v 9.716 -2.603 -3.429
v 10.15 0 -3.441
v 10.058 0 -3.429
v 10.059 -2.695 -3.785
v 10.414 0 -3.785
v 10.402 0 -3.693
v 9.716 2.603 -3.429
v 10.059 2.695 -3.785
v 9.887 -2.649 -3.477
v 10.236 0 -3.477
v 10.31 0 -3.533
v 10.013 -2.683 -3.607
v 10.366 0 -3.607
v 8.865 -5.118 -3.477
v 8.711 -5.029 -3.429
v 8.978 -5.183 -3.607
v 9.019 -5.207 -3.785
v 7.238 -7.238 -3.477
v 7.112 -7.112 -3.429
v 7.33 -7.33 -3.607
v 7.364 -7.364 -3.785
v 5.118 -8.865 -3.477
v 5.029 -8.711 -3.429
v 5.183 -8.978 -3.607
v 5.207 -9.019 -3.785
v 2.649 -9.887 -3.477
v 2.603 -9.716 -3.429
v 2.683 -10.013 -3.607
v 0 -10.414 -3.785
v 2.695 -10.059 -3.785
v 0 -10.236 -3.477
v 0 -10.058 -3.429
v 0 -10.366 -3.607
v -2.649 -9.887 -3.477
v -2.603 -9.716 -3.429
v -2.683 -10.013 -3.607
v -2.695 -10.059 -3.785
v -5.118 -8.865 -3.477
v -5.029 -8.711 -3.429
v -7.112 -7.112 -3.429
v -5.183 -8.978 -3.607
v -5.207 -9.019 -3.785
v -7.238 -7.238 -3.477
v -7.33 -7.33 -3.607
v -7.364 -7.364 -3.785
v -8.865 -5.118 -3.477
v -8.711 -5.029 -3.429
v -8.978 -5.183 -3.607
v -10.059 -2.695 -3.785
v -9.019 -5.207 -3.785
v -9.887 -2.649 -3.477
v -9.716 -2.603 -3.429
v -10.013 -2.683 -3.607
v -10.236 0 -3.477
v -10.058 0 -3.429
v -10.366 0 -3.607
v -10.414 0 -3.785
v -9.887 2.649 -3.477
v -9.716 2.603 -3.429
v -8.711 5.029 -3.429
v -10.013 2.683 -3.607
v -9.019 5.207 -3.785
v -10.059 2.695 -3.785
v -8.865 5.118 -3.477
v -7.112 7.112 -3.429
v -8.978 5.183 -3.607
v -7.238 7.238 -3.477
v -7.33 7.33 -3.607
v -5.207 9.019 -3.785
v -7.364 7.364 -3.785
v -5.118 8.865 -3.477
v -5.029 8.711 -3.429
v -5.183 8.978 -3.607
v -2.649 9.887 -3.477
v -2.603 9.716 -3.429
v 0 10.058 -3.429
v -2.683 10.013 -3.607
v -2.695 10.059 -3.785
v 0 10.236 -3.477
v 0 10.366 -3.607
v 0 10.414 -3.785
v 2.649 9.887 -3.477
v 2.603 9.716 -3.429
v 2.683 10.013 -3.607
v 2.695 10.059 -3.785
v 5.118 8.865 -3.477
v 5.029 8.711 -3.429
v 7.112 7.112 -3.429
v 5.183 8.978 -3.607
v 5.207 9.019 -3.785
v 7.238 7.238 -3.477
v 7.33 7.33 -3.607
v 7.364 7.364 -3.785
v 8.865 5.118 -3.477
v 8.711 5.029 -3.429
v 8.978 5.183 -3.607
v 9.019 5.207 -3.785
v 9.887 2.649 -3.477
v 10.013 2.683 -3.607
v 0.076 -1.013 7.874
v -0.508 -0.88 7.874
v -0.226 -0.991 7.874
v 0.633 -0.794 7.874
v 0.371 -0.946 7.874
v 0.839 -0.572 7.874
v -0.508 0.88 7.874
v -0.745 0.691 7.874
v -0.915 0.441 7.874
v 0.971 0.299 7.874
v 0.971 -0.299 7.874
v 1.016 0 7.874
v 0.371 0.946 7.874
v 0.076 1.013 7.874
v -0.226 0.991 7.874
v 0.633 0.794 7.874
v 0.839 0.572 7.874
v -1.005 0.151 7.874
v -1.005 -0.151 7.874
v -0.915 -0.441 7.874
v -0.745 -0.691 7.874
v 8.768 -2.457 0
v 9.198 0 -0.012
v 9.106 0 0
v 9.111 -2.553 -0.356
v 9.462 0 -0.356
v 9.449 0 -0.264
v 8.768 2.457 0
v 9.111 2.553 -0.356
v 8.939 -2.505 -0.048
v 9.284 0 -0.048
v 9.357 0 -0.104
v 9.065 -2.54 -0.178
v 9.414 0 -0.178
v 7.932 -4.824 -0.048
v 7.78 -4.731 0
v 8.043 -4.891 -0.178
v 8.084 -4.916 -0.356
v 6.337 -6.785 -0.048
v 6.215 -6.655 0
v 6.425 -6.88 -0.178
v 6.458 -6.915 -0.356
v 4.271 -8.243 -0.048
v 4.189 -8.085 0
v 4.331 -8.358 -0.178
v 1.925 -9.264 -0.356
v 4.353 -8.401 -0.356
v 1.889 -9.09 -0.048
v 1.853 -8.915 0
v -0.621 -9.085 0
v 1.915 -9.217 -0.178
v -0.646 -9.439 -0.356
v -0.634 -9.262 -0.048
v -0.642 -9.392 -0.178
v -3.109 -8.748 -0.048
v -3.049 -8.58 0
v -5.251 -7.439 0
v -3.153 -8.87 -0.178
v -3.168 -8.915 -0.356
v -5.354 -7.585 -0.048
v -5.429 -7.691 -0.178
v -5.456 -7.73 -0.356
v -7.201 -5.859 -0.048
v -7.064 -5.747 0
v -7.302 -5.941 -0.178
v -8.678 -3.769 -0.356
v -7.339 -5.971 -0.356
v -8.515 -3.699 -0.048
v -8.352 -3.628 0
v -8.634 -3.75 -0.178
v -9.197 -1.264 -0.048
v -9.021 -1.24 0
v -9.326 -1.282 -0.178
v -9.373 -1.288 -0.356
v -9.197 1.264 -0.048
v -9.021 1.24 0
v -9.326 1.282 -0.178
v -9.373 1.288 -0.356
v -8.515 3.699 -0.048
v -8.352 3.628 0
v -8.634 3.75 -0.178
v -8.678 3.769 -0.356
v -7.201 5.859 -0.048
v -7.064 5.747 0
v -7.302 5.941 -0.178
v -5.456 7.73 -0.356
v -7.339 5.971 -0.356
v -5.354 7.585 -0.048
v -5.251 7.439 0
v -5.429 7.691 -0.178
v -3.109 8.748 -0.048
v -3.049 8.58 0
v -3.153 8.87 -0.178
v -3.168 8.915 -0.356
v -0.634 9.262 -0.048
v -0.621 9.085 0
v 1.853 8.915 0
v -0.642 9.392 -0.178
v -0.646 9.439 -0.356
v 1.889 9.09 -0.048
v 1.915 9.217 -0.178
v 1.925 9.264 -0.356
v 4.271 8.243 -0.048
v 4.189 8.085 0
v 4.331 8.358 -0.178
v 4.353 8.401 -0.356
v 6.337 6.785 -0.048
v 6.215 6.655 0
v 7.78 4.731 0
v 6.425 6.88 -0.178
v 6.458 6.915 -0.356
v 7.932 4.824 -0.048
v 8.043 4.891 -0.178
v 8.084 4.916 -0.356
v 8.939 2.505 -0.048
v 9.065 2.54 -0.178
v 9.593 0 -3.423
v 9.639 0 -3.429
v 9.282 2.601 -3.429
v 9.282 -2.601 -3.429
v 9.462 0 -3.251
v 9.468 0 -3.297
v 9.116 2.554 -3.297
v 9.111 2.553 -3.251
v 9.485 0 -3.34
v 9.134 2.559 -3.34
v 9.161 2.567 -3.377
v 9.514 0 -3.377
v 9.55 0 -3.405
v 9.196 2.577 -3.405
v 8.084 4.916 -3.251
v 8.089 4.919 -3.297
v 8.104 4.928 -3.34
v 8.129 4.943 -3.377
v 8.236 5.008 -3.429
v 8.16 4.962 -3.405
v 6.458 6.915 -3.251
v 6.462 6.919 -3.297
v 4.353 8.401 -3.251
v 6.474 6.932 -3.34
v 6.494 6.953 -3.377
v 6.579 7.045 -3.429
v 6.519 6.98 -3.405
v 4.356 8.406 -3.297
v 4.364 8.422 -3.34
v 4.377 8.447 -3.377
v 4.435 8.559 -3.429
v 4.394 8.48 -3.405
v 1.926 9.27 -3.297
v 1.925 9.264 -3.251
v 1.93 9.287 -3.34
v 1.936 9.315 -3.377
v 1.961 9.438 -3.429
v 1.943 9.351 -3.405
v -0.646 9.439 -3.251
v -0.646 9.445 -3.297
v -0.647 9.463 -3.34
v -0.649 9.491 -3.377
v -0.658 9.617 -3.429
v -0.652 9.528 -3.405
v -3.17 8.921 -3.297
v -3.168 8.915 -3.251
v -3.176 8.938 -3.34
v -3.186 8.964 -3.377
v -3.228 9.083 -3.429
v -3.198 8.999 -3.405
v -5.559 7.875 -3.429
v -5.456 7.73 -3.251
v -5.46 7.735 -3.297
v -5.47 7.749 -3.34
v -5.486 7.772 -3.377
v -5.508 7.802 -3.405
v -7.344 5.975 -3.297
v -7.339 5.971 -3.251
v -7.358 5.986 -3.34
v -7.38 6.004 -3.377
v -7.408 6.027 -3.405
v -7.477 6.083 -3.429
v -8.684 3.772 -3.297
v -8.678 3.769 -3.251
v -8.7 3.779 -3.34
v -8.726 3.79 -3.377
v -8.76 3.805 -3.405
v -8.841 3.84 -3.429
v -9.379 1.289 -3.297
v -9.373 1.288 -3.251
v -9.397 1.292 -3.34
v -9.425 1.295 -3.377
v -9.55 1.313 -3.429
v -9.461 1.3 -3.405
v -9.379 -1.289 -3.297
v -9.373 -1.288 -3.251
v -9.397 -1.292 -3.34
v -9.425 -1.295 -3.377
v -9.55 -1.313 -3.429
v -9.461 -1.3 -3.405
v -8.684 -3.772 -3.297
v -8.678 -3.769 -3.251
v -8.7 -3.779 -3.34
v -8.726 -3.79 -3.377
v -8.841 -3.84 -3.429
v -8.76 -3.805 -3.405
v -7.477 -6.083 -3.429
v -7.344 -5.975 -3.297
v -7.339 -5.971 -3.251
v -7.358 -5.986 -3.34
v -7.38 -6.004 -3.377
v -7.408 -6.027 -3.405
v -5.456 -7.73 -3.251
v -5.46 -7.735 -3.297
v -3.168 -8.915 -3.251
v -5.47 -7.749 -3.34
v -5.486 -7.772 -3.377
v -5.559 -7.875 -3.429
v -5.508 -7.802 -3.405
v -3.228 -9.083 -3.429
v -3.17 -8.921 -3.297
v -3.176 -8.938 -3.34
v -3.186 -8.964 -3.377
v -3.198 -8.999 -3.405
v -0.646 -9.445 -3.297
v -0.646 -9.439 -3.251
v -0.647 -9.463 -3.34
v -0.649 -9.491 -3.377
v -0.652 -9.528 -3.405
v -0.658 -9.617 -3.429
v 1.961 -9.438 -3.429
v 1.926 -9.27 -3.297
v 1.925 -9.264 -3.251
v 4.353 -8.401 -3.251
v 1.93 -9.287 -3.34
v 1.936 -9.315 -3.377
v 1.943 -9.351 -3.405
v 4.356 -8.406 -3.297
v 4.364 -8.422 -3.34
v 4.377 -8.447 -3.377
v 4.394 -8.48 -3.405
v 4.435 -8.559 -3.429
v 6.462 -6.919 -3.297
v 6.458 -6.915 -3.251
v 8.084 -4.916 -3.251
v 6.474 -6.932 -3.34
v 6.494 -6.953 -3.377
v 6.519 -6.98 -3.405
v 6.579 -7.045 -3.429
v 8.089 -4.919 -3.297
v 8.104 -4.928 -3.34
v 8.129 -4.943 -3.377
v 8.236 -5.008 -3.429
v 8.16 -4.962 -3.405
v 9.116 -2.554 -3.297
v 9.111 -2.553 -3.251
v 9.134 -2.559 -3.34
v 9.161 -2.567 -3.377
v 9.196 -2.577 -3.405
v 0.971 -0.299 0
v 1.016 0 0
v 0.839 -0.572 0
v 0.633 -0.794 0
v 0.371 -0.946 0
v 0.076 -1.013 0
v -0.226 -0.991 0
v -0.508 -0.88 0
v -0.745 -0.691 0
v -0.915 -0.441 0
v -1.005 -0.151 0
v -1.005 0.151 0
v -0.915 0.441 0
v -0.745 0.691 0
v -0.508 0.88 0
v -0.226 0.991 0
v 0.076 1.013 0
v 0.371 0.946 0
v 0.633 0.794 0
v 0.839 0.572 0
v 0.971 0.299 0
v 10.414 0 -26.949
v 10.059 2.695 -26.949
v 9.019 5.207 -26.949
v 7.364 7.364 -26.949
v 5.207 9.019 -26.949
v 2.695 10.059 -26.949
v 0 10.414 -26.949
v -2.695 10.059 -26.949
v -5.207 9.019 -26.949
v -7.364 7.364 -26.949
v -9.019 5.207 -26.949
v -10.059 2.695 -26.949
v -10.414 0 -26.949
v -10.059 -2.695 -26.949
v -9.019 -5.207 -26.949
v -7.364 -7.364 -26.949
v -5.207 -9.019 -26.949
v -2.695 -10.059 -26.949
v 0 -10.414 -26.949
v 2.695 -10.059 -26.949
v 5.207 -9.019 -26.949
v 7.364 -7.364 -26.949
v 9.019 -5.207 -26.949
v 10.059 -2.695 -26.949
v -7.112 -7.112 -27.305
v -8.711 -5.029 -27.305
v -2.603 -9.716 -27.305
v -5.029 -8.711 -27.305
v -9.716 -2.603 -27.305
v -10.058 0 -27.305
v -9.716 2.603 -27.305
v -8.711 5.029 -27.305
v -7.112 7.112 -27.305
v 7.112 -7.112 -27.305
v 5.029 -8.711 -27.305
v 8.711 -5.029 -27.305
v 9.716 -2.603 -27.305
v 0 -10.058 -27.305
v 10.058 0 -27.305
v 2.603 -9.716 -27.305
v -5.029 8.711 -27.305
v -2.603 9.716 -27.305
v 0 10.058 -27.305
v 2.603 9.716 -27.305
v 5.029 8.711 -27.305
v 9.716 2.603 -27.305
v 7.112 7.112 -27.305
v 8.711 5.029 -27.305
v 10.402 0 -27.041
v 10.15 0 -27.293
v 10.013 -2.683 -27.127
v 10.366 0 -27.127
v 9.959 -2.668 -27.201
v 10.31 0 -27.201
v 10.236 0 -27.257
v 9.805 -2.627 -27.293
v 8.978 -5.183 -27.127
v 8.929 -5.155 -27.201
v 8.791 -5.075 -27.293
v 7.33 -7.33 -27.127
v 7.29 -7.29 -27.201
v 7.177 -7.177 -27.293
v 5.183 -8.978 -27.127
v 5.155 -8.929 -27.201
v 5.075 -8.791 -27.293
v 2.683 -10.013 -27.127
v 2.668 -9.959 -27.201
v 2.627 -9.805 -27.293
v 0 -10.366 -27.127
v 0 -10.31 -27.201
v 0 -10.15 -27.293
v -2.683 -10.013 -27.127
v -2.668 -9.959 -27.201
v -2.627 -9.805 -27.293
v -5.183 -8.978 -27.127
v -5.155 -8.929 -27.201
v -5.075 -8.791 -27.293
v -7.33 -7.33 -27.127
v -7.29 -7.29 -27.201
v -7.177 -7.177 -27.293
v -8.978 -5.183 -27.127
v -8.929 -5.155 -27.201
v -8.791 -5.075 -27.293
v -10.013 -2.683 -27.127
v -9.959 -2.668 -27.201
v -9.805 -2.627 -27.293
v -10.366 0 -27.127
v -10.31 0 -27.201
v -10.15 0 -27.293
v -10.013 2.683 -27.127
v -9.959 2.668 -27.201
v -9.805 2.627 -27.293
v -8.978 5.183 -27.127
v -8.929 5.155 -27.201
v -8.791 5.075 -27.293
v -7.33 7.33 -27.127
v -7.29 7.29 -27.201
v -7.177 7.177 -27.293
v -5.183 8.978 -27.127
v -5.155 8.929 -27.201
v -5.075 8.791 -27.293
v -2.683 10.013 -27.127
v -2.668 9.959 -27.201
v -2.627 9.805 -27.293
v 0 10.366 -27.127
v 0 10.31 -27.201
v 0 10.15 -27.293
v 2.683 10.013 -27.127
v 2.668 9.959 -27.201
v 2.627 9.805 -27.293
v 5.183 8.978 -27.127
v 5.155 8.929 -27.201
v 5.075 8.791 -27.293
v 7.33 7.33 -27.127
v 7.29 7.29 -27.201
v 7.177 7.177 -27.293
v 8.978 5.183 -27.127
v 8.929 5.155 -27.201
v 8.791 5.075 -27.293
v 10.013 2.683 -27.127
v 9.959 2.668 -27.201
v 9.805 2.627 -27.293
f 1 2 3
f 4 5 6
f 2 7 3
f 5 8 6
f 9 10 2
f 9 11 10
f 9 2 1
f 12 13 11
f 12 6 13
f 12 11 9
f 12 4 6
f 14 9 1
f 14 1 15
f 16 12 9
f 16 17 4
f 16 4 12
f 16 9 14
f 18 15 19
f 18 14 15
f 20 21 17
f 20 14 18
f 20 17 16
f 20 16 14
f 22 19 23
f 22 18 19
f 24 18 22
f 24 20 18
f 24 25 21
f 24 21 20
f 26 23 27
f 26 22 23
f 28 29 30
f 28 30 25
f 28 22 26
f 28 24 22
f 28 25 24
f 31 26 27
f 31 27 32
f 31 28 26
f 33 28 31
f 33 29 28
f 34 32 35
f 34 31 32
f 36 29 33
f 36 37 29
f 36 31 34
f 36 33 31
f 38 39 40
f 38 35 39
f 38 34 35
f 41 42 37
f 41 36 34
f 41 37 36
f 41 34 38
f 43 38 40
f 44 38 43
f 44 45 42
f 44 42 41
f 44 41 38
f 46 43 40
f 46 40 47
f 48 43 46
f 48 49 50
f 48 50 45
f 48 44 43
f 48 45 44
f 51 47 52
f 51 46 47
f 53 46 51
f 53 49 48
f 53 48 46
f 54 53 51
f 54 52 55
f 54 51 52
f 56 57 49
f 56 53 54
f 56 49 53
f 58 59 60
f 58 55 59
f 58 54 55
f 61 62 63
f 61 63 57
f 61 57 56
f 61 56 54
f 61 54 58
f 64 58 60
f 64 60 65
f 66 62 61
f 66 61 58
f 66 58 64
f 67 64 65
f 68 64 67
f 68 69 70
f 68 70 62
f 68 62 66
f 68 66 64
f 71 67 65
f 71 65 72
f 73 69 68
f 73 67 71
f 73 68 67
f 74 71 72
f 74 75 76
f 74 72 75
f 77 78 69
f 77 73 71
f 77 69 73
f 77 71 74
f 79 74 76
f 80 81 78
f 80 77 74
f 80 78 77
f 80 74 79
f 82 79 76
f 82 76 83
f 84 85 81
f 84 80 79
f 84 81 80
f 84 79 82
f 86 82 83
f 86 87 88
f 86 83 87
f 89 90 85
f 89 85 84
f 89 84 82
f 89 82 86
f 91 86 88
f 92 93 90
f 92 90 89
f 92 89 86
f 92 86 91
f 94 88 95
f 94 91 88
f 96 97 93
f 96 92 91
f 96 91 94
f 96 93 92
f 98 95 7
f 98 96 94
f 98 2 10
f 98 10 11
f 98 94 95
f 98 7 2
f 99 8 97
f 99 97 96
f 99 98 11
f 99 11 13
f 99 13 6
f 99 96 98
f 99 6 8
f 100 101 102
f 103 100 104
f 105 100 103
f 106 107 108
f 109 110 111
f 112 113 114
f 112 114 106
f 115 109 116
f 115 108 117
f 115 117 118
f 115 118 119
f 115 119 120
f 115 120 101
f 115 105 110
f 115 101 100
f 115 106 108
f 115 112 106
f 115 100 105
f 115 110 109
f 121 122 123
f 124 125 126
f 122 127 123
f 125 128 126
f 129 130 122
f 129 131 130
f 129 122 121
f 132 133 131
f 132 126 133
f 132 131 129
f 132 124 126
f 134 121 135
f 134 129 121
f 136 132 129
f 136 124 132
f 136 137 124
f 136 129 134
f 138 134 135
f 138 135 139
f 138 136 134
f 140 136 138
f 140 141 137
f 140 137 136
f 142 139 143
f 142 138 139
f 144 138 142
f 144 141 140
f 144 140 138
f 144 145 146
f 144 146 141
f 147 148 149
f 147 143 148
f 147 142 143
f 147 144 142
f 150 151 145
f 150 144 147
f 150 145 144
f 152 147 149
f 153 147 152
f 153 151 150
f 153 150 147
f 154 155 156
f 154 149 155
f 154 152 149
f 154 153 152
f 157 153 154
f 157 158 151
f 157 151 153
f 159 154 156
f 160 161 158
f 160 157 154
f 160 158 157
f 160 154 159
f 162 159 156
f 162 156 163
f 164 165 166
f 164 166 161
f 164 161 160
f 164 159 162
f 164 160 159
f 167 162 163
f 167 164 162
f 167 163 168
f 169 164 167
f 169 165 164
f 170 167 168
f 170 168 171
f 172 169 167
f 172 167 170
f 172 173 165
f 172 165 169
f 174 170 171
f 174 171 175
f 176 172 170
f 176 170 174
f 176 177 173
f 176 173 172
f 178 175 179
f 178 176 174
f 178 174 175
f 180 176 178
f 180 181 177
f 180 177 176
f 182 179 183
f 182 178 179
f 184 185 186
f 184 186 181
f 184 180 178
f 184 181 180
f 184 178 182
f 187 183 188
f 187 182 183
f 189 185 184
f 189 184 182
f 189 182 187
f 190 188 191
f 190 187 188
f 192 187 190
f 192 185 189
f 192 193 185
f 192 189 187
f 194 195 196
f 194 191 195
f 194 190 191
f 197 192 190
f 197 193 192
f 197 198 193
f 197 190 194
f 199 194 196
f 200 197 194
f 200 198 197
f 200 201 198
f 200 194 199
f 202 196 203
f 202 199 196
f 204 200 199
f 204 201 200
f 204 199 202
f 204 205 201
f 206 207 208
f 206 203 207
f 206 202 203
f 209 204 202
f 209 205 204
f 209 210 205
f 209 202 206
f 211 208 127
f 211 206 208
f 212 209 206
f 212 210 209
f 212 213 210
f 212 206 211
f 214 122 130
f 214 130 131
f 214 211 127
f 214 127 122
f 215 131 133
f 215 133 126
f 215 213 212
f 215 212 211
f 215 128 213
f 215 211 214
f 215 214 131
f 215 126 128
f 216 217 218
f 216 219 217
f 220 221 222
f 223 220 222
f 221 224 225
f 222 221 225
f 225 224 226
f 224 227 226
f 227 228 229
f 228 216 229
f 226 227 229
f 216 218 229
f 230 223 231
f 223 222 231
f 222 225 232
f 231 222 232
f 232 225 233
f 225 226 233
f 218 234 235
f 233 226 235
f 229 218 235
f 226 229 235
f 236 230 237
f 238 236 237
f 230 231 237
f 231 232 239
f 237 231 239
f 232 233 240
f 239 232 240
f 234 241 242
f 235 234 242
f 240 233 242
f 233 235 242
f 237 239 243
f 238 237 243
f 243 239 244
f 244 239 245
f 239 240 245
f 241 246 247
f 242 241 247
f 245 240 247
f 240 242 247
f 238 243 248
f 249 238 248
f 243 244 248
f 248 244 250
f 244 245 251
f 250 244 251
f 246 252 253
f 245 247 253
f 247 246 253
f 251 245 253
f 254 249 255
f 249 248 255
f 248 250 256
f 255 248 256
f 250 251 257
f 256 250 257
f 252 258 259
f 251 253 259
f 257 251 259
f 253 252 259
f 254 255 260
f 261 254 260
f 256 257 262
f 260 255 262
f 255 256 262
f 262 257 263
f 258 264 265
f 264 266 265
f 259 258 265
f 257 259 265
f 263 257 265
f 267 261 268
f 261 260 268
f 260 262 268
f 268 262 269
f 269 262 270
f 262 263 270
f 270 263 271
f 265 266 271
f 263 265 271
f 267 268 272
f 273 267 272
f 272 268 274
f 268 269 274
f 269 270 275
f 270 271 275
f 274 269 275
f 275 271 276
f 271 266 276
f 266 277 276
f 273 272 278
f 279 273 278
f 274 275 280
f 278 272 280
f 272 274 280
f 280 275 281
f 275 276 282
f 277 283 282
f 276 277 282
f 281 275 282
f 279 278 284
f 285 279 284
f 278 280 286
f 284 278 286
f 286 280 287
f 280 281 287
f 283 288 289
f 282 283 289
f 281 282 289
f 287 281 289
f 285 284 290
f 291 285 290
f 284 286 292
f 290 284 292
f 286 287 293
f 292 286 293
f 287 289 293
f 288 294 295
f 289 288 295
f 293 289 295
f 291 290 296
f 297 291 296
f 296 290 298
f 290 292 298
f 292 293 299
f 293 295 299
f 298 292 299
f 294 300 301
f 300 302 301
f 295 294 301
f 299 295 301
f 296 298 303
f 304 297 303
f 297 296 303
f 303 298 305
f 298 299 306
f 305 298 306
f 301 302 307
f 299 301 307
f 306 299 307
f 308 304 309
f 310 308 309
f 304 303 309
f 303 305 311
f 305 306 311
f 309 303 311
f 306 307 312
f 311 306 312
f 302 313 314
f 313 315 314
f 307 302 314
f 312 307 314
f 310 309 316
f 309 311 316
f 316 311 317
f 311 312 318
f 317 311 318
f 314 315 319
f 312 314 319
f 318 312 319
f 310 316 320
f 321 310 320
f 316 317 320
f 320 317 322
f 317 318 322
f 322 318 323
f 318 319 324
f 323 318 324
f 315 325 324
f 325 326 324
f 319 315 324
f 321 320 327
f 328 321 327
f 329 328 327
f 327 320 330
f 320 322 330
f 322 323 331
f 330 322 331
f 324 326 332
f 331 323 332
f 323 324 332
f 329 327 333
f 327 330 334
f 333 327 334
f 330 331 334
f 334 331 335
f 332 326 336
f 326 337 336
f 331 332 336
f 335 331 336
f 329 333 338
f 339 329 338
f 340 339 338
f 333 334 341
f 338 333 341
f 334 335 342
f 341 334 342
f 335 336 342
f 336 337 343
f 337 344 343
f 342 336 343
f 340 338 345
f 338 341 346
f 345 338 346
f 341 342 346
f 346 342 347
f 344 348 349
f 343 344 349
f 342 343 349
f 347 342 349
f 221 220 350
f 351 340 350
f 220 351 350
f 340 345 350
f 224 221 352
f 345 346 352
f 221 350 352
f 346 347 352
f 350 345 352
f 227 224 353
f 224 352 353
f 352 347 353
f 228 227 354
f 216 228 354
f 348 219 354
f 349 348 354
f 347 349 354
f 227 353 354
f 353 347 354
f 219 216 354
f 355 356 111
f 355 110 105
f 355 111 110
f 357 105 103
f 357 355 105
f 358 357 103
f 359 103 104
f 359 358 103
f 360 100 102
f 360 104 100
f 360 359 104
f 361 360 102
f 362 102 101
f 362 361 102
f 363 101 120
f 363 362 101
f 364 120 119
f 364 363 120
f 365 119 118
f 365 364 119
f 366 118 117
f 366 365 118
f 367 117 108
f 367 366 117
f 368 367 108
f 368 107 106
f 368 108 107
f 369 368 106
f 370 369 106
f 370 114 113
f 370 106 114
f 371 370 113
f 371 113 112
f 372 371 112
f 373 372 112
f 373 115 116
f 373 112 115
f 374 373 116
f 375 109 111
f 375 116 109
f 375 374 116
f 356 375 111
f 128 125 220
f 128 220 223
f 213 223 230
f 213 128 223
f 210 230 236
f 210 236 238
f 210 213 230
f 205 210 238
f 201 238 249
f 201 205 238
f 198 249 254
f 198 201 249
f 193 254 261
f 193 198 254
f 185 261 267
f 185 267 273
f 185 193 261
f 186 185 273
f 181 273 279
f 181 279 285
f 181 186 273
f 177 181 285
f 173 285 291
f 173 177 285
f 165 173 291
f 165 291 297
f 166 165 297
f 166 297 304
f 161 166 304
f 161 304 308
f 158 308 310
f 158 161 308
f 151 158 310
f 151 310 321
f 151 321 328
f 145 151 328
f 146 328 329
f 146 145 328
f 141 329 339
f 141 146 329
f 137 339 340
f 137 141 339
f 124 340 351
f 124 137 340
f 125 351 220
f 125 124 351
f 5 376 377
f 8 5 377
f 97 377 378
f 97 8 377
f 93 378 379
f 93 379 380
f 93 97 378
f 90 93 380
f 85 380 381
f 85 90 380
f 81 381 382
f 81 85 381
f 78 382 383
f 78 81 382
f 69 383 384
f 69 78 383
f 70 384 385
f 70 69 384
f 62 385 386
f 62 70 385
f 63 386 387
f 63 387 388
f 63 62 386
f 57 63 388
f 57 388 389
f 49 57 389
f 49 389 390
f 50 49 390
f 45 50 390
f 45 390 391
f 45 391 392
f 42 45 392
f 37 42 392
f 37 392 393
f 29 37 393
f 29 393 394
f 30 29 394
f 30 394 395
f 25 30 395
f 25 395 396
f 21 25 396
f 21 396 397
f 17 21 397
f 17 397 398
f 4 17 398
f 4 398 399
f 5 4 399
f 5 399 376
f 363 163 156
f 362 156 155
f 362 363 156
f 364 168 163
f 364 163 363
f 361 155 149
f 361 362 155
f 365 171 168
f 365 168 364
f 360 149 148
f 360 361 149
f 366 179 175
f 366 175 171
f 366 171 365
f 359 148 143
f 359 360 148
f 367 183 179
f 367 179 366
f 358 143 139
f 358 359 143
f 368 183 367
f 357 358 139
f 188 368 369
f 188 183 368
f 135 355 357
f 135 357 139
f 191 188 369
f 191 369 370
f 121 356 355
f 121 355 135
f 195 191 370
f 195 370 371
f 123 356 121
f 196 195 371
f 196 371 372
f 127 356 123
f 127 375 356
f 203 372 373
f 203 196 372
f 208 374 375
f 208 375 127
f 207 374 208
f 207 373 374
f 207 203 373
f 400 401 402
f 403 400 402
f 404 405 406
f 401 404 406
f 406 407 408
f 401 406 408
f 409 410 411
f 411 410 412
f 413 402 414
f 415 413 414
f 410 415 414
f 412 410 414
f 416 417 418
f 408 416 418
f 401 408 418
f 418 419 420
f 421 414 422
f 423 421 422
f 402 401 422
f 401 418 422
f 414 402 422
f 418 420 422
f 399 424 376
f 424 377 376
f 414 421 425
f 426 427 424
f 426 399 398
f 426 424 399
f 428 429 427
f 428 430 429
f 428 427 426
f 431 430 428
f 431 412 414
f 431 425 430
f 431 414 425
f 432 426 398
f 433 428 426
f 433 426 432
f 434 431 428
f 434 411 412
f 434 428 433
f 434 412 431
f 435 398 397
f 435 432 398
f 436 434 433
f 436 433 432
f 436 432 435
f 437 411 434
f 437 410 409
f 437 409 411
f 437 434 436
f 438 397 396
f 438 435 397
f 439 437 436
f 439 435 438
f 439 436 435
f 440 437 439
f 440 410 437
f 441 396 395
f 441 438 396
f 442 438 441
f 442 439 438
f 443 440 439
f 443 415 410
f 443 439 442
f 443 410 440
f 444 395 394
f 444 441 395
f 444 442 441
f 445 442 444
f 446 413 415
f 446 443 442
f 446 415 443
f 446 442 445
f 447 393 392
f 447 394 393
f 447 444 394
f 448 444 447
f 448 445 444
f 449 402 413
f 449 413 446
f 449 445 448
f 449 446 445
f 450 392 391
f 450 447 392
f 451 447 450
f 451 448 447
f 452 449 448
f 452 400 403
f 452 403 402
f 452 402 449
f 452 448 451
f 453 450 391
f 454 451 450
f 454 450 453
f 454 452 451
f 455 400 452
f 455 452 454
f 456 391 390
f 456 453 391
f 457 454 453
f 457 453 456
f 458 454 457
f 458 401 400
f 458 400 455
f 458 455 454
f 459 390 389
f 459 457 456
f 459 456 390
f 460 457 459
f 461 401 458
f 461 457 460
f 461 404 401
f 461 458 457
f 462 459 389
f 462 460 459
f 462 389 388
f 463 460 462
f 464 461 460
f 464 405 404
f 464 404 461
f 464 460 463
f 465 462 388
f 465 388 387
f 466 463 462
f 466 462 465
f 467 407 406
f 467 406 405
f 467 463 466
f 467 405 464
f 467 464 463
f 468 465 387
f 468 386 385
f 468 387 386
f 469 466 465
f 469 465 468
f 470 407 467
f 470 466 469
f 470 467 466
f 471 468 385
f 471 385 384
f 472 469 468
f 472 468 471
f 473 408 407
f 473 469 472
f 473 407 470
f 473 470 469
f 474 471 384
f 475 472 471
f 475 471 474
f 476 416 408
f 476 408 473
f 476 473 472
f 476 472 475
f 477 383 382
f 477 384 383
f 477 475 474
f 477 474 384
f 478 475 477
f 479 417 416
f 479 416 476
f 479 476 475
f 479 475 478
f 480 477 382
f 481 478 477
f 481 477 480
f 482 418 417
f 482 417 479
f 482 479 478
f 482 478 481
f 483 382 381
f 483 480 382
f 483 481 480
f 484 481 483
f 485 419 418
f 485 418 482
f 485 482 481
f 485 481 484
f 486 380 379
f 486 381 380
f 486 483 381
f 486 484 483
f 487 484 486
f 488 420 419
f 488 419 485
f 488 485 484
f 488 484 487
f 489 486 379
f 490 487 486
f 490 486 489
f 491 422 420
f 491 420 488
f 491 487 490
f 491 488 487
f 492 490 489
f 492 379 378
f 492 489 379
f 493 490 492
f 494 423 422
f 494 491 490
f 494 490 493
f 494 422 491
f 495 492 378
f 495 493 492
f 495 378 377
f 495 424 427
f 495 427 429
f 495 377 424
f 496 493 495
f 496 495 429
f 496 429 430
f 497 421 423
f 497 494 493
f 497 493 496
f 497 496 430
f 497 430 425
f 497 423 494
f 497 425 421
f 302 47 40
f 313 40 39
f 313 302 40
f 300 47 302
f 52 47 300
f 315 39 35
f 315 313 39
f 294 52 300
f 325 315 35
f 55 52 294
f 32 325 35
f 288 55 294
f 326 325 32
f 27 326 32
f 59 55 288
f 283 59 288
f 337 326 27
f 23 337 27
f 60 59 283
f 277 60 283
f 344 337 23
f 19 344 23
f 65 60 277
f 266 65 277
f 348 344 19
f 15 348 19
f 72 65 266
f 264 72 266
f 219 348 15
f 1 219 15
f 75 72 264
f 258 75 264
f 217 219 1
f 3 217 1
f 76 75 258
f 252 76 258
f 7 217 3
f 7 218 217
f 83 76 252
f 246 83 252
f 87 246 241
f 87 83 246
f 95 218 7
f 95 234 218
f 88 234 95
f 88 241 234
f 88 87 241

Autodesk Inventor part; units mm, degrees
ref_plane "YZ Plane" through (0, 0, 0) normal (1, 0, 0) x (0, 1, 0)
ref_plane "XZ Plane" through (0, 0, 0) normal (0, 1, 0) x (-1, 0, 0)
ref_plane "XY Plane" through (0, 0, 0) normal (0, 0, 1) x (1, 0, 0)
sketch "Sketch1" plane through (0, 0, 0) normal (0, 0, 1) x (1, 0, 0)
  circle A0 centre (0, 0) radius 1.016
  circle A1 centre (0, 0) radius 10.414
  dimension "d0" = 2.032
  dimension "d1" = 20.828
extrude "Extrusion1" add sketch "Sketch1" along normal blind 7.874 contours A0
extrude "Extrusion2" add sketch "Sketch1" against normal blind 27.305 contours A0 | A1
sketch "Sketch2" plane through (0, 0, 0) normal (0, 0, 1) x (1, 0, 0)
  circle A0 centre (0, 0) radius 9.4615
  circle A1 centre (0, 0) radius 10.414
  dimension "d6" = 18.923
extrude "Extrusion3" cut sketch "Sketch2" against normal blind 3.429
fillet "Fillet1" radius 0.3556 3 edges at (-9.4615, 0, 0) (-10.414, 0, -3.429) (-10.414, 0, -27.305)
fillet "Fillet2" radius 0.1778 1 edges at (-9.4615, 0, -3.429)
properties part number "Motor"
